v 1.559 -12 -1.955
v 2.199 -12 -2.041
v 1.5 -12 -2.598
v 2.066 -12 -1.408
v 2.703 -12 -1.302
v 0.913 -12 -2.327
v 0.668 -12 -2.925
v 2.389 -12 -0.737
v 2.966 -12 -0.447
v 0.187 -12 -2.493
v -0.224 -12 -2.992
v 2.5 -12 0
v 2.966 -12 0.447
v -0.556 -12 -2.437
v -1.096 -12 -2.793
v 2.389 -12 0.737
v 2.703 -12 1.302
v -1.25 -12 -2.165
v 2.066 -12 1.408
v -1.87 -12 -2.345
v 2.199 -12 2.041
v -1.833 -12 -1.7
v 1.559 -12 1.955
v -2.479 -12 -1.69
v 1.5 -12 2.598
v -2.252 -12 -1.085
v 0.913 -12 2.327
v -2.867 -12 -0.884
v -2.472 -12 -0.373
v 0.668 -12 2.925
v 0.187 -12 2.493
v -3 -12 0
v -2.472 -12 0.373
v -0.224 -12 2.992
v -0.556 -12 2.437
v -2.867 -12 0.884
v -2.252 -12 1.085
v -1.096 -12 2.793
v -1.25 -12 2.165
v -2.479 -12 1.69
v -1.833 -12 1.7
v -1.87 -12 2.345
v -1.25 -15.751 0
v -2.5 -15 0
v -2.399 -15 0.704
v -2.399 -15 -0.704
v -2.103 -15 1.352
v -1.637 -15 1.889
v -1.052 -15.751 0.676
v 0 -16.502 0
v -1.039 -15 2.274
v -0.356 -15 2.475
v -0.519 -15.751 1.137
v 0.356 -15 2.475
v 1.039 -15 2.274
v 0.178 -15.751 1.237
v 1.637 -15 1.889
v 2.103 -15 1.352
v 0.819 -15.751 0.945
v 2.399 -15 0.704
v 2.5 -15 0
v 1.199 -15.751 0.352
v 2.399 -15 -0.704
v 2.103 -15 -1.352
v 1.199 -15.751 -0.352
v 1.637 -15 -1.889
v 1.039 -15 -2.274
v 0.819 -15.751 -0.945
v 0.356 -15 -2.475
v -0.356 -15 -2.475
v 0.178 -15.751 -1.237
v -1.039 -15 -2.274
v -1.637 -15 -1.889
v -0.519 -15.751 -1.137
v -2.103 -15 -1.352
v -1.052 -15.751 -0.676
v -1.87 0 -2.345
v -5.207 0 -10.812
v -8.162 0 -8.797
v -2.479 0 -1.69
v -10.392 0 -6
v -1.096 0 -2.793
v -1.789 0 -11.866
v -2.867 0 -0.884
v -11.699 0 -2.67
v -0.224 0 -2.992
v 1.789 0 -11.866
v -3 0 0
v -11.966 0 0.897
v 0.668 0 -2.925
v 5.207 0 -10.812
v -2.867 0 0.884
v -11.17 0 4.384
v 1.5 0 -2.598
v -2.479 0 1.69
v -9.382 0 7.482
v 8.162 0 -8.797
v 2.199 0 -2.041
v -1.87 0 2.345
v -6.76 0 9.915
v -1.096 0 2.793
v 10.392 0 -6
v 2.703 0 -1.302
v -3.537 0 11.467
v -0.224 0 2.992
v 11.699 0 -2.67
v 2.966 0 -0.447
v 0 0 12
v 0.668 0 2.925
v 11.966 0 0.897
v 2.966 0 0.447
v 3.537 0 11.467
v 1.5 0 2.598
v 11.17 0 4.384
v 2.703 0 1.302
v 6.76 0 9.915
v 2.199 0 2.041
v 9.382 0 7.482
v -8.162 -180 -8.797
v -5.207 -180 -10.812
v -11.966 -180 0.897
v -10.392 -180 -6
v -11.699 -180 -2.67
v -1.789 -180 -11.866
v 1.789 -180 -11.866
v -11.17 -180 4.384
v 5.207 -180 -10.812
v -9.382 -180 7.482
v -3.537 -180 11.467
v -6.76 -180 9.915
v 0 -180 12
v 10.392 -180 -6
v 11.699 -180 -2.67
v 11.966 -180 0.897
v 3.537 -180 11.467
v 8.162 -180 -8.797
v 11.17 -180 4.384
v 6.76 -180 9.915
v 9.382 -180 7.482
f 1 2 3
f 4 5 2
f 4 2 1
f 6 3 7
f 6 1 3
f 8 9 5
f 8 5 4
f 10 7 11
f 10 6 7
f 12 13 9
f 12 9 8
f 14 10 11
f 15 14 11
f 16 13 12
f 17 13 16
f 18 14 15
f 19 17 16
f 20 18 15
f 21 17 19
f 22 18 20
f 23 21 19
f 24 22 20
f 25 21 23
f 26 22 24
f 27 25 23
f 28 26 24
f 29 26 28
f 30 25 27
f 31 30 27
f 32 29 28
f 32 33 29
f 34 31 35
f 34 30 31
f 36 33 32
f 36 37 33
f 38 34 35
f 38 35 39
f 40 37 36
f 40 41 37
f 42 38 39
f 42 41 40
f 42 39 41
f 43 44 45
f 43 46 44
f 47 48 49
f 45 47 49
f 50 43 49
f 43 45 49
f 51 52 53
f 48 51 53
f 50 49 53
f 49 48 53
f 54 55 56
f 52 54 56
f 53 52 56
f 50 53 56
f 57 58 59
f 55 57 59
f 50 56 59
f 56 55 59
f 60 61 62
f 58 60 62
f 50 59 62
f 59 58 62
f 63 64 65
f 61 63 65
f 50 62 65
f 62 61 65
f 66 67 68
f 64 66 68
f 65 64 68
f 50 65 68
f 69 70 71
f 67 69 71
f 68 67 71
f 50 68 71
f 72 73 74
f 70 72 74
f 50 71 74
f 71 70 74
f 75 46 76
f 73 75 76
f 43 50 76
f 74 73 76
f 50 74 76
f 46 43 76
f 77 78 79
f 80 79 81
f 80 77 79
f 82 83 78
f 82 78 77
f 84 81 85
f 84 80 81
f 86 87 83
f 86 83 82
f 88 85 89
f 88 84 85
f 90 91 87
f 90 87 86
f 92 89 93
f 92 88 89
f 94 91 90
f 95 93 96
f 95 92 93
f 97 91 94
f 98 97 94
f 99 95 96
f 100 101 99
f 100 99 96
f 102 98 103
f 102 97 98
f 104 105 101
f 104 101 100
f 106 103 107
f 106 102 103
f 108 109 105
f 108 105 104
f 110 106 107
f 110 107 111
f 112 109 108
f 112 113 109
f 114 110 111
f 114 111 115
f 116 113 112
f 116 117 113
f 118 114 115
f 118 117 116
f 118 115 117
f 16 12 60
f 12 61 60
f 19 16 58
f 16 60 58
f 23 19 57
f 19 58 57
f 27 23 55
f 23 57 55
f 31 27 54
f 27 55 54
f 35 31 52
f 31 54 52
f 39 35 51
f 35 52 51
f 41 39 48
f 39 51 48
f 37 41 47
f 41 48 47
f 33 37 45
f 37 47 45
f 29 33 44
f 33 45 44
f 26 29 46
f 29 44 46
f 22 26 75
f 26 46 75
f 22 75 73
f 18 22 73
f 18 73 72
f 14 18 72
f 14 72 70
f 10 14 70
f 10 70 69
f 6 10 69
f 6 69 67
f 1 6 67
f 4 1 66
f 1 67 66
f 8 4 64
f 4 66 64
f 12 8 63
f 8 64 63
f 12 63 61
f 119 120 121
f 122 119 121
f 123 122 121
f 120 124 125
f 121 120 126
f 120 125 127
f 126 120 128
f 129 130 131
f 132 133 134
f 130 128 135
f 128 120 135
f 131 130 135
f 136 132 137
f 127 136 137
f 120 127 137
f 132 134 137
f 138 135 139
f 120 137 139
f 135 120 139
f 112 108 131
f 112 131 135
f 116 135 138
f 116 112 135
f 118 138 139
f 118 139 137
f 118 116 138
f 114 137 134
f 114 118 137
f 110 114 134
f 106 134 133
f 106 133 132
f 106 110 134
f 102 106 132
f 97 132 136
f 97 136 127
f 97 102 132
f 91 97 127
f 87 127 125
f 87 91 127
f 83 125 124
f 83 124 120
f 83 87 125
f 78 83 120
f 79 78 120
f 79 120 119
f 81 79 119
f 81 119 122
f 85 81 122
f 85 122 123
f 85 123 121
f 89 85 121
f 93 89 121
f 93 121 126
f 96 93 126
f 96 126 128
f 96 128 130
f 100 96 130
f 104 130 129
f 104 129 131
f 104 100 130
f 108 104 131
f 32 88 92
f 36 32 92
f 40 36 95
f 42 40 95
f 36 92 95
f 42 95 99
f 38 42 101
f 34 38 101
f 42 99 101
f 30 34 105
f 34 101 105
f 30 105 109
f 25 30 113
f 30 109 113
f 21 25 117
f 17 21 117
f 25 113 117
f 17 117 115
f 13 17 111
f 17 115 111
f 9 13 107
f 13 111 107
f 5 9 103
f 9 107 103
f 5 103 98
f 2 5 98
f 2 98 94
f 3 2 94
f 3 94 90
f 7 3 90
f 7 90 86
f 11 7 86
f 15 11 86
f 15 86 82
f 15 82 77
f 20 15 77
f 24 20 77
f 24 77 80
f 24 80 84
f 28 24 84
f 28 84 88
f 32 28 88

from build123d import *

# Parameters (mm, degrees)
SKETCH1_R                   = 12
EXTRUDE1_DEPTH              = 180
M6_TAPPED_HOLE1_D           = 5
M6_TAPPED_HOLE1_DEPTH       = 15
M6_TAPPED_HOLE1_CBORE_D     = 6
M6_TAPPED_HOLE1_CBORE_DEPTH = 12
M6_TAPPED_HOLE1_TIP         = 1.502151548


with BuildPart() as part:
    # Sketch1 → Extrude1 (new body)
    with BuildSketch(Plane(origin=(0, 0, 0), x_dir=(1, 0, 0), z_dir=(0, 1, 0))):
        with Locations(Location((0, 0, 0), (0, 0, 270))):
            Circle(SKETCH1_R)
    extrude(amount=-EXTRUDE1_DEPTH)

    # M6 Tapped Hole1
    with Locations(Plane(origin=(0, 0, 0), x_dir=(-1, 0, 0), z_dir=(0, 1, 0))):
        with Locations((0, 0)):
            CounterBoreHole(M6_TAPPED_HOLE1_D / 2, M6_TAPPED_HOLE1_CBORE_D / 2, M6_TAPPED_HOLE1_CBORE_DEPTH, depth=M6_TAPPED_HOLE1_DEPTH)
            with Locations((0, 0, -(M6_TAPPED_HOLE1_DEPTH + M6_TAPPED_HOLE1_TIP / 2))):  # 118° drill point
                Cone(0, M6_TAPPED_HOLE1_D / 2, M6_TAPPED_HOLE1_TIP, mode=Mode.SUBTRACT)


solid = part.part
